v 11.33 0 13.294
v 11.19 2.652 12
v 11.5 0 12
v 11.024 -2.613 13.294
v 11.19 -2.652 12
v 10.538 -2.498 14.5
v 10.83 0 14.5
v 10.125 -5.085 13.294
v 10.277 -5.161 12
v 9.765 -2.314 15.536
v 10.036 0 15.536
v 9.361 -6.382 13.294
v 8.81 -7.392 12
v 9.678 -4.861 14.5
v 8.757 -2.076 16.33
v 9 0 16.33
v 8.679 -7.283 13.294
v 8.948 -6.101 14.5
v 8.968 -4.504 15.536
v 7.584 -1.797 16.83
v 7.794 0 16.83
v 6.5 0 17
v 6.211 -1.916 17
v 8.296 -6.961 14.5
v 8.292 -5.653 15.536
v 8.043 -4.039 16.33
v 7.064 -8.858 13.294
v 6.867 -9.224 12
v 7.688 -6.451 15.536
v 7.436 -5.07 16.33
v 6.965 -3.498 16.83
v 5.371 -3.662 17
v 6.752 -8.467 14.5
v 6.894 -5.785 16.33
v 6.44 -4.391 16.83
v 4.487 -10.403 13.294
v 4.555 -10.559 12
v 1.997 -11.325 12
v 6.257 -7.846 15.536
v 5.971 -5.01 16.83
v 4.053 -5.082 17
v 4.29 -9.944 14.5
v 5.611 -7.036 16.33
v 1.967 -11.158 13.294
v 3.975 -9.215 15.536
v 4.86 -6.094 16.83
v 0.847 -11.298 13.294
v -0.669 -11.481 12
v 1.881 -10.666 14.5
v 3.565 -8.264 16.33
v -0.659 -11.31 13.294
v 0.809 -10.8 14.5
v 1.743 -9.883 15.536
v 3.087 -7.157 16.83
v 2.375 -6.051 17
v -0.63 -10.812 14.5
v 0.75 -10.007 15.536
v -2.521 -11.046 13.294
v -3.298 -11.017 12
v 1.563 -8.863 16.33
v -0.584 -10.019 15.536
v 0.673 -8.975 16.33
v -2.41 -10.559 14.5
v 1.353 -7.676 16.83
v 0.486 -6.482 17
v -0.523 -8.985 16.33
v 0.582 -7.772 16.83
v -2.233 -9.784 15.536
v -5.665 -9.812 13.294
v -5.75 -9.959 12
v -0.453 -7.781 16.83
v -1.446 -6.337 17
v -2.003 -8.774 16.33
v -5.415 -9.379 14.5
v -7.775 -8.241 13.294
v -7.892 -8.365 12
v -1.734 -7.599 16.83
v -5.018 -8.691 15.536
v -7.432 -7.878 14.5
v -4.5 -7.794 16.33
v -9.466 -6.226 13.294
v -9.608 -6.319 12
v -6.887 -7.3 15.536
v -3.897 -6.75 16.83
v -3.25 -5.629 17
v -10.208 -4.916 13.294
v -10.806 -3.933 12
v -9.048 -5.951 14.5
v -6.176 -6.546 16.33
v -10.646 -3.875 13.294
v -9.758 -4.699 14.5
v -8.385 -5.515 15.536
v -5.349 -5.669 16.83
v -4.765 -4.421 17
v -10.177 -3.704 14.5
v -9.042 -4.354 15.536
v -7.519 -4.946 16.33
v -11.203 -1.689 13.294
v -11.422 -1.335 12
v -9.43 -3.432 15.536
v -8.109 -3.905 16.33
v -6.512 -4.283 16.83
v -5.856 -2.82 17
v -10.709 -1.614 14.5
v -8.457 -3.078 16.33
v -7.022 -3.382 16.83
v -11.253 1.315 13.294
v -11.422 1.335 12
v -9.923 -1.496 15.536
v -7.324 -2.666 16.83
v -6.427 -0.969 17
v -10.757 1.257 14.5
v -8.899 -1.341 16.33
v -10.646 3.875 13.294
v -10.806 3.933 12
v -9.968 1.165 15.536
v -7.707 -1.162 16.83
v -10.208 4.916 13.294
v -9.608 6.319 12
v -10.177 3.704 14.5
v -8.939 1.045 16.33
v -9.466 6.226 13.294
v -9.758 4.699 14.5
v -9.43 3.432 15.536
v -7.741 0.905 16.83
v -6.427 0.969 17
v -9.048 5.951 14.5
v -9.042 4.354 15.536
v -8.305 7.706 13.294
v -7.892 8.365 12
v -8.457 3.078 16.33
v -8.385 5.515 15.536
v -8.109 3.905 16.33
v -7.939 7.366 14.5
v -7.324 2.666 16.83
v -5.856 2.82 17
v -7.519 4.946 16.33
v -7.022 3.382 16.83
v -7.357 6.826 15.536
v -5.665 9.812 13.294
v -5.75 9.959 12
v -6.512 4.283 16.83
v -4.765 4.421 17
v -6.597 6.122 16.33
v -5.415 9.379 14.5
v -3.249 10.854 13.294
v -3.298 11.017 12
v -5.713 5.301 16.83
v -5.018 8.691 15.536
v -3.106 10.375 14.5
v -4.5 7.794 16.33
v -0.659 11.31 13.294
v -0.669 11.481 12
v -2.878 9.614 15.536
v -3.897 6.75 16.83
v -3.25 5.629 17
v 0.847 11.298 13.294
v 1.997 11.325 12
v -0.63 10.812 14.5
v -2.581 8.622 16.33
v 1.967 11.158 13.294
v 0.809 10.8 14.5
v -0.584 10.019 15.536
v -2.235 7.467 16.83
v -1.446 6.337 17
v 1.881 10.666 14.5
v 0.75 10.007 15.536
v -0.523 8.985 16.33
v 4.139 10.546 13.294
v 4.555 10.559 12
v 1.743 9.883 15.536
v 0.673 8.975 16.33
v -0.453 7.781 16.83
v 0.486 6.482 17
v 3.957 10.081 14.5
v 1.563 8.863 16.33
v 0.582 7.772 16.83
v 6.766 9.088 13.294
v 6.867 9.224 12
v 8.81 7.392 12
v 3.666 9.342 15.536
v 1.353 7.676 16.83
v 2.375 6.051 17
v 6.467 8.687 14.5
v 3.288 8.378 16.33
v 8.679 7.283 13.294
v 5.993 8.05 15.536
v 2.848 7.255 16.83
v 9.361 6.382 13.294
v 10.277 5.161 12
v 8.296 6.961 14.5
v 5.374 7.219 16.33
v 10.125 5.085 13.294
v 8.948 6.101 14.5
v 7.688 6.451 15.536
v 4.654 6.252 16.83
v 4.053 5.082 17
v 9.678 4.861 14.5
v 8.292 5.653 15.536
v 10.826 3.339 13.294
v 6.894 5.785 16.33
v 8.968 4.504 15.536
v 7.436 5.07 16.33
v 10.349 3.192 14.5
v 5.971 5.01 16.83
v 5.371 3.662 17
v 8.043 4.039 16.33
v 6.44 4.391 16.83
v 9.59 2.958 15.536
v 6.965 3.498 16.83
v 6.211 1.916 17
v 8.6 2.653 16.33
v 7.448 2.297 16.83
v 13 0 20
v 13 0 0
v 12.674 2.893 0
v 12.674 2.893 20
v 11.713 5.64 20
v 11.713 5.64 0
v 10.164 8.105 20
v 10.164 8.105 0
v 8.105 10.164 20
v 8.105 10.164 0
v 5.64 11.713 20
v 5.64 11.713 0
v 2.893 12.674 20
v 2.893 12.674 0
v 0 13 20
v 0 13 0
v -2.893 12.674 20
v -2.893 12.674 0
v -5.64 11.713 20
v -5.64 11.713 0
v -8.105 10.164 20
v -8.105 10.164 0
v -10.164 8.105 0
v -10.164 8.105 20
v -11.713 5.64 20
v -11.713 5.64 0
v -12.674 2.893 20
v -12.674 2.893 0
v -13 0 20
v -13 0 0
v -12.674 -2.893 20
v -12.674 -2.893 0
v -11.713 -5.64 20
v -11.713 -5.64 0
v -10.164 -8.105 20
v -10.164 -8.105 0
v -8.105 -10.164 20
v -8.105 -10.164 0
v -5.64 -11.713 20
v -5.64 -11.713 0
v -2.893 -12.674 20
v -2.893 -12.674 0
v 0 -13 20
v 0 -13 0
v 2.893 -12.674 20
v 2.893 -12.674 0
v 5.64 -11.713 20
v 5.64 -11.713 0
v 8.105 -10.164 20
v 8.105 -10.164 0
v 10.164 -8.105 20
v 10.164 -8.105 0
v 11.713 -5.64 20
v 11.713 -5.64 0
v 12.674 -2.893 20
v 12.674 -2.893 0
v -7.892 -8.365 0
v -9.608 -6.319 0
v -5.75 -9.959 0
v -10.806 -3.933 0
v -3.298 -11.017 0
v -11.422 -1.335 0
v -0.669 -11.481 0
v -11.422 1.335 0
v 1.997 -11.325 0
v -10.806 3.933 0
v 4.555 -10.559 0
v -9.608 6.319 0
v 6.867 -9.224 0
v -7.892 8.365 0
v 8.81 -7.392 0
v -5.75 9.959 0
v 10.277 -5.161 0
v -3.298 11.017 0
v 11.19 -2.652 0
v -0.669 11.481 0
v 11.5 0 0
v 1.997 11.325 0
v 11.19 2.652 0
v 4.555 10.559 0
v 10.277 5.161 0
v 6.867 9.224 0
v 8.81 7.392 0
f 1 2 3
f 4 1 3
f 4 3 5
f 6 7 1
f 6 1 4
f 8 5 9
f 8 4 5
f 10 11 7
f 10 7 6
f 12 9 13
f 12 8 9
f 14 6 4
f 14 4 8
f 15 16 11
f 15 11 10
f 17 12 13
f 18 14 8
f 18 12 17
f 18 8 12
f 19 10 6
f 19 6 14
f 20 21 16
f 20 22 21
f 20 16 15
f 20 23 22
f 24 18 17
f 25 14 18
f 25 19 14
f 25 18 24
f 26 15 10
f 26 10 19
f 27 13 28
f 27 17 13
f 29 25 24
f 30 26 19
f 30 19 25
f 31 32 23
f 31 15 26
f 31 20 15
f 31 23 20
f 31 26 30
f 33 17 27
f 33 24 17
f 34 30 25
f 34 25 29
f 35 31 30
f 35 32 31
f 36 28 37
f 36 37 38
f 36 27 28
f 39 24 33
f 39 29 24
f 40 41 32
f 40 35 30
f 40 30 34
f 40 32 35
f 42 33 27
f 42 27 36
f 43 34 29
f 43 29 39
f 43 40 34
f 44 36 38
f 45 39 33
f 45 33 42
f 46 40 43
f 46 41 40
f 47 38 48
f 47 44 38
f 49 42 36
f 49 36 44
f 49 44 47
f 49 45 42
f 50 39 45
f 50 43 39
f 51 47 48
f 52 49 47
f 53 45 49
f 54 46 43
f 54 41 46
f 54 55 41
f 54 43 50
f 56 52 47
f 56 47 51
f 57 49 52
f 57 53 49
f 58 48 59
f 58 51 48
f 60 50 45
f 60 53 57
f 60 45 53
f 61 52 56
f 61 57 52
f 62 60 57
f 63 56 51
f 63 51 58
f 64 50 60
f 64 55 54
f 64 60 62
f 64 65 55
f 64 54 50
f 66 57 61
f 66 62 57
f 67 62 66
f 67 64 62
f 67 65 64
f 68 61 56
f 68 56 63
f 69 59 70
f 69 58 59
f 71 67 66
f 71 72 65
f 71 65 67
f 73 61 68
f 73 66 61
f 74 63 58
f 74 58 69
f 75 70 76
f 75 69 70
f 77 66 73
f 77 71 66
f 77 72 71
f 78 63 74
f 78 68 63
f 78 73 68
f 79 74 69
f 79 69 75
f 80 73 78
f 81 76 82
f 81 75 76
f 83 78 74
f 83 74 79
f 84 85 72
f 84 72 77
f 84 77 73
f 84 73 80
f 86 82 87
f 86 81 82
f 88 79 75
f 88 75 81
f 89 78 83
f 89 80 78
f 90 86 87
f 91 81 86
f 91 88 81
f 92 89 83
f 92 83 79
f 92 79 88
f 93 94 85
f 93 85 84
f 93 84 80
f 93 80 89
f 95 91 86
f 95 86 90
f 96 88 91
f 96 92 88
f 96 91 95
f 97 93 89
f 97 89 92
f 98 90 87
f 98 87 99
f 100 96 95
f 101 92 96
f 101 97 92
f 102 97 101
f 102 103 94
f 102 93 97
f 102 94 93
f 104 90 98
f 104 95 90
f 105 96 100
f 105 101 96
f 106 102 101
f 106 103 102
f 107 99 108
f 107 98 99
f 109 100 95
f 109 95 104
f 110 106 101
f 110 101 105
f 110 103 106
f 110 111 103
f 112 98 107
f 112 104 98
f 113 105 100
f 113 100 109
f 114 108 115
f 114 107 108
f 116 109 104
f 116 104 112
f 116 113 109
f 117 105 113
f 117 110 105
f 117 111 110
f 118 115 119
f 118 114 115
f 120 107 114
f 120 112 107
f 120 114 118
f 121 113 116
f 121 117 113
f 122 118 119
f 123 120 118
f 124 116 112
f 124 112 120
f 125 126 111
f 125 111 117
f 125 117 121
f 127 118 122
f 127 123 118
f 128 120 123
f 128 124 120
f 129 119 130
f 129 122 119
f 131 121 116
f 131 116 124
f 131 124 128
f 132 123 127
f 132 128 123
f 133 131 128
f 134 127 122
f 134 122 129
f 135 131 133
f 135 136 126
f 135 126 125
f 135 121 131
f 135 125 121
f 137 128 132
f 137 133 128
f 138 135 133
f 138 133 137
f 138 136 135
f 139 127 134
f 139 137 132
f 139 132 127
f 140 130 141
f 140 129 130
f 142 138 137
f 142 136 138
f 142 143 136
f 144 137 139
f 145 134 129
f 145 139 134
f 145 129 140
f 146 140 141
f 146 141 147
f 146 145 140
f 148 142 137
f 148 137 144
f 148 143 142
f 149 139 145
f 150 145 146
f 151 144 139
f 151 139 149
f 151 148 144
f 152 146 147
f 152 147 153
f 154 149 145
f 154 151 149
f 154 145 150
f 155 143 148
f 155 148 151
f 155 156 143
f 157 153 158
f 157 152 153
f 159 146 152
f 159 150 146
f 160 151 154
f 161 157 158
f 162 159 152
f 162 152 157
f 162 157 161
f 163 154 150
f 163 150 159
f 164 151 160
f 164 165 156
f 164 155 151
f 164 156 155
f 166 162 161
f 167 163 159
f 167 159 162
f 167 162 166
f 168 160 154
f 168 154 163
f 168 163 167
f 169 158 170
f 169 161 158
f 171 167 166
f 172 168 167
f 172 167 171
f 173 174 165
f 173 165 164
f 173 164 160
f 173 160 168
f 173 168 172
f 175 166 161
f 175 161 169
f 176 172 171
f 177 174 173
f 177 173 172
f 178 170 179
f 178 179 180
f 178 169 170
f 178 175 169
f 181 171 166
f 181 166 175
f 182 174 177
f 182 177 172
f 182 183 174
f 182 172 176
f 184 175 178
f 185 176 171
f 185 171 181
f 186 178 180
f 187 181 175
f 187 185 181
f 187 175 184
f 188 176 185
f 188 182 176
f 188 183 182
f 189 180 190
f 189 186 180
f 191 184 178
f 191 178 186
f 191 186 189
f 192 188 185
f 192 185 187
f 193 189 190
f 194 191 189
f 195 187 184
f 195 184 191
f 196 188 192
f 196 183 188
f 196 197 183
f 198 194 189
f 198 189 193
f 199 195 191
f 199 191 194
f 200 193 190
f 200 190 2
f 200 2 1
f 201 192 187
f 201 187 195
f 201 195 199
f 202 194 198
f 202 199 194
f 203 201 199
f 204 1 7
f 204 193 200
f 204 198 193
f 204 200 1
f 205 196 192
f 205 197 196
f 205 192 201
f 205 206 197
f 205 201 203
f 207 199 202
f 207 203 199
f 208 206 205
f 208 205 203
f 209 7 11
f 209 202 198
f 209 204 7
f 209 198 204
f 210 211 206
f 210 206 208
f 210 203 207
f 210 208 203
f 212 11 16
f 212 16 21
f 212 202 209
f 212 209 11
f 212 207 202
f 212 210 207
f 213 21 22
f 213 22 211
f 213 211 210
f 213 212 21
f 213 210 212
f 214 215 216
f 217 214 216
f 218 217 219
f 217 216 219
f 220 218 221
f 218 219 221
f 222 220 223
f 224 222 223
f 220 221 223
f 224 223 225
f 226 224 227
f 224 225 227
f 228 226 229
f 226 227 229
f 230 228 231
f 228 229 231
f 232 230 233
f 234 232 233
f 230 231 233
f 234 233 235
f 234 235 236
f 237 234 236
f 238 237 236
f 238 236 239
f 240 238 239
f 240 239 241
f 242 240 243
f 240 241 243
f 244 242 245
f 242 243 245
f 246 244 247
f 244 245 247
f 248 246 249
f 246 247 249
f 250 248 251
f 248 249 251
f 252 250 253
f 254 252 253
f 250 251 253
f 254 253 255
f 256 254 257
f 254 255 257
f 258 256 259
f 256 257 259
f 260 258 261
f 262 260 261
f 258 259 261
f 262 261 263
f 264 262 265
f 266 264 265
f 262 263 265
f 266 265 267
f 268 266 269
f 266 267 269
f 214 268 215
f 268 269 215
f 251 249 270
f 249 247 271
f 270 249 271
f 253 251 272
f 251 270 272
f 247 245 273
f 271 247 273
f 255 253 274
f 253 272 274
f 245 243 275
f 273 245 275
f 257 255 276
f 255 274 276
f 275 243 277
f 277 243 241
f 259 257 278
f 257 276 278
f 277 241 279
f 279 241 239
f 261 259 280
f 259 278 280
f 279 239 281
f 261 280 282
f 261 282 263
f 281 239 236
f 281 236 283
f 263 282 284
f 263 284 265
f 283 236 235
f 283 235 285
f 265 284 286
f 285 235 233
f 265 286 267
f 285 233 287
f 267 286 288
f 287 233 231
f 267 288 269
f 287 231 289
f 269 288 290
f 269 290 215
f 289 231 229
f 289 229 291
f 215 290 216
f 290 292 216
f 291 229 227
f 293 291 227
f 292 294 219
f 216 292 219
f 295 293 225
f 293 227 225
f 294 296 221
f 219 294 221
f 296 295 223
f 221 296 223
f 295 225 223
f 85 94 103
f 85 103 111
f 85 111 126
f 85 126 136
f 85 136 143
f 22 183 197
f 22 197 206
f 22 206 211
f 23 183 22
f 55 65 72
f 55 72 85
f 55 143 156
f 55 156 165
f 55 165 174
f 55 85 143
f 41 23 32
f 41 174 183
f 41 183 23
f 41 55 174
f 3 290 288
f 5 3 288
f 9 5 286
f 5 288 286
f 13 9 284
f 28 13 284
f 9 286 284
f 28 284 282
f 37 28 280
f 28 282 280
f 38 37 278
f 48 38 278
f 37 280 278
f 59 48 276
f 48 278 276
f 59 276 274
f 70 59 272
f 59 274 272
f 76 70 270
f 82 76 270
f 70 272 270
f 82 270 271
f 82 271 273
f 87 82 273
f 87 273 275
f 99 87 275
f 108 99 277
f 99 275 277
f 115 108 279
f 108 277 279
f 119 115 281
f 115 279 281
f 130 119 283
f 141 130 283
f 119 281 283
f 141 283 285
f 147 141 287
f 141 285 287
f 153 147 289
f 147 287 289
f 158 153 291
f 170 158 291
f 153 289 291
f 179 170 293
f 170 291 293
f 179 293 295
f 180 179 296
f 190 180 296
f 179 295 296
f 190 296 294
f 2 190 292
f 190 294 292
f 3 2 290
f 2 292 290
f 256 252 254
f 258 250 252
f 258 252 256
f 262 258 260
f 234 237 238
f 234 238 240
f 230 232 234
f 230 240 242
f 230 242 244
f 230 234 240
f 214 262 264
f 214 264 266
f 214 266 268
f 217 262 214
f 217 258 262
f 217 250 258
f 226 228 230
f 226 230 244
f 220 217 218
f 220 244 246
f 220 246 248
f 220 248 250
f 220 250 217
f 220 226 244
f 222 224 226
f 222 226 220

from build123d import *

# Parameters (mm, degrees)
F0_R     = 13
F1_DEPTH = 20
F2_R     = 11.5
F3_DEPTH = 17
F4_R     = 5


with BuildPart() as f1:
    # F0 (on Top) → F1 (new body)
    with BuildSketch(Plane.XY):
        Circle(F0_R)
    extrude(amount=F1_DEPTH)

    # F2 (on face) → F3 (cut)
    with BuildSketch(Plane(origin=(0, 0, 0), x_dir=(1, 0, 0), z_dir=(0, 0, -1))):
        Circle(F2_R)
    extrude(amount=-F3_DEPTH, mode=Mode.SUBTRACT)

    # F4
    f4_edges = [f1.edges().sort_by_distance(p)[0] for p in [
        (-11.5, 0, 17),
    ]]
    fillet(f4_edges, radius=F4_R)


solid = f1.part
